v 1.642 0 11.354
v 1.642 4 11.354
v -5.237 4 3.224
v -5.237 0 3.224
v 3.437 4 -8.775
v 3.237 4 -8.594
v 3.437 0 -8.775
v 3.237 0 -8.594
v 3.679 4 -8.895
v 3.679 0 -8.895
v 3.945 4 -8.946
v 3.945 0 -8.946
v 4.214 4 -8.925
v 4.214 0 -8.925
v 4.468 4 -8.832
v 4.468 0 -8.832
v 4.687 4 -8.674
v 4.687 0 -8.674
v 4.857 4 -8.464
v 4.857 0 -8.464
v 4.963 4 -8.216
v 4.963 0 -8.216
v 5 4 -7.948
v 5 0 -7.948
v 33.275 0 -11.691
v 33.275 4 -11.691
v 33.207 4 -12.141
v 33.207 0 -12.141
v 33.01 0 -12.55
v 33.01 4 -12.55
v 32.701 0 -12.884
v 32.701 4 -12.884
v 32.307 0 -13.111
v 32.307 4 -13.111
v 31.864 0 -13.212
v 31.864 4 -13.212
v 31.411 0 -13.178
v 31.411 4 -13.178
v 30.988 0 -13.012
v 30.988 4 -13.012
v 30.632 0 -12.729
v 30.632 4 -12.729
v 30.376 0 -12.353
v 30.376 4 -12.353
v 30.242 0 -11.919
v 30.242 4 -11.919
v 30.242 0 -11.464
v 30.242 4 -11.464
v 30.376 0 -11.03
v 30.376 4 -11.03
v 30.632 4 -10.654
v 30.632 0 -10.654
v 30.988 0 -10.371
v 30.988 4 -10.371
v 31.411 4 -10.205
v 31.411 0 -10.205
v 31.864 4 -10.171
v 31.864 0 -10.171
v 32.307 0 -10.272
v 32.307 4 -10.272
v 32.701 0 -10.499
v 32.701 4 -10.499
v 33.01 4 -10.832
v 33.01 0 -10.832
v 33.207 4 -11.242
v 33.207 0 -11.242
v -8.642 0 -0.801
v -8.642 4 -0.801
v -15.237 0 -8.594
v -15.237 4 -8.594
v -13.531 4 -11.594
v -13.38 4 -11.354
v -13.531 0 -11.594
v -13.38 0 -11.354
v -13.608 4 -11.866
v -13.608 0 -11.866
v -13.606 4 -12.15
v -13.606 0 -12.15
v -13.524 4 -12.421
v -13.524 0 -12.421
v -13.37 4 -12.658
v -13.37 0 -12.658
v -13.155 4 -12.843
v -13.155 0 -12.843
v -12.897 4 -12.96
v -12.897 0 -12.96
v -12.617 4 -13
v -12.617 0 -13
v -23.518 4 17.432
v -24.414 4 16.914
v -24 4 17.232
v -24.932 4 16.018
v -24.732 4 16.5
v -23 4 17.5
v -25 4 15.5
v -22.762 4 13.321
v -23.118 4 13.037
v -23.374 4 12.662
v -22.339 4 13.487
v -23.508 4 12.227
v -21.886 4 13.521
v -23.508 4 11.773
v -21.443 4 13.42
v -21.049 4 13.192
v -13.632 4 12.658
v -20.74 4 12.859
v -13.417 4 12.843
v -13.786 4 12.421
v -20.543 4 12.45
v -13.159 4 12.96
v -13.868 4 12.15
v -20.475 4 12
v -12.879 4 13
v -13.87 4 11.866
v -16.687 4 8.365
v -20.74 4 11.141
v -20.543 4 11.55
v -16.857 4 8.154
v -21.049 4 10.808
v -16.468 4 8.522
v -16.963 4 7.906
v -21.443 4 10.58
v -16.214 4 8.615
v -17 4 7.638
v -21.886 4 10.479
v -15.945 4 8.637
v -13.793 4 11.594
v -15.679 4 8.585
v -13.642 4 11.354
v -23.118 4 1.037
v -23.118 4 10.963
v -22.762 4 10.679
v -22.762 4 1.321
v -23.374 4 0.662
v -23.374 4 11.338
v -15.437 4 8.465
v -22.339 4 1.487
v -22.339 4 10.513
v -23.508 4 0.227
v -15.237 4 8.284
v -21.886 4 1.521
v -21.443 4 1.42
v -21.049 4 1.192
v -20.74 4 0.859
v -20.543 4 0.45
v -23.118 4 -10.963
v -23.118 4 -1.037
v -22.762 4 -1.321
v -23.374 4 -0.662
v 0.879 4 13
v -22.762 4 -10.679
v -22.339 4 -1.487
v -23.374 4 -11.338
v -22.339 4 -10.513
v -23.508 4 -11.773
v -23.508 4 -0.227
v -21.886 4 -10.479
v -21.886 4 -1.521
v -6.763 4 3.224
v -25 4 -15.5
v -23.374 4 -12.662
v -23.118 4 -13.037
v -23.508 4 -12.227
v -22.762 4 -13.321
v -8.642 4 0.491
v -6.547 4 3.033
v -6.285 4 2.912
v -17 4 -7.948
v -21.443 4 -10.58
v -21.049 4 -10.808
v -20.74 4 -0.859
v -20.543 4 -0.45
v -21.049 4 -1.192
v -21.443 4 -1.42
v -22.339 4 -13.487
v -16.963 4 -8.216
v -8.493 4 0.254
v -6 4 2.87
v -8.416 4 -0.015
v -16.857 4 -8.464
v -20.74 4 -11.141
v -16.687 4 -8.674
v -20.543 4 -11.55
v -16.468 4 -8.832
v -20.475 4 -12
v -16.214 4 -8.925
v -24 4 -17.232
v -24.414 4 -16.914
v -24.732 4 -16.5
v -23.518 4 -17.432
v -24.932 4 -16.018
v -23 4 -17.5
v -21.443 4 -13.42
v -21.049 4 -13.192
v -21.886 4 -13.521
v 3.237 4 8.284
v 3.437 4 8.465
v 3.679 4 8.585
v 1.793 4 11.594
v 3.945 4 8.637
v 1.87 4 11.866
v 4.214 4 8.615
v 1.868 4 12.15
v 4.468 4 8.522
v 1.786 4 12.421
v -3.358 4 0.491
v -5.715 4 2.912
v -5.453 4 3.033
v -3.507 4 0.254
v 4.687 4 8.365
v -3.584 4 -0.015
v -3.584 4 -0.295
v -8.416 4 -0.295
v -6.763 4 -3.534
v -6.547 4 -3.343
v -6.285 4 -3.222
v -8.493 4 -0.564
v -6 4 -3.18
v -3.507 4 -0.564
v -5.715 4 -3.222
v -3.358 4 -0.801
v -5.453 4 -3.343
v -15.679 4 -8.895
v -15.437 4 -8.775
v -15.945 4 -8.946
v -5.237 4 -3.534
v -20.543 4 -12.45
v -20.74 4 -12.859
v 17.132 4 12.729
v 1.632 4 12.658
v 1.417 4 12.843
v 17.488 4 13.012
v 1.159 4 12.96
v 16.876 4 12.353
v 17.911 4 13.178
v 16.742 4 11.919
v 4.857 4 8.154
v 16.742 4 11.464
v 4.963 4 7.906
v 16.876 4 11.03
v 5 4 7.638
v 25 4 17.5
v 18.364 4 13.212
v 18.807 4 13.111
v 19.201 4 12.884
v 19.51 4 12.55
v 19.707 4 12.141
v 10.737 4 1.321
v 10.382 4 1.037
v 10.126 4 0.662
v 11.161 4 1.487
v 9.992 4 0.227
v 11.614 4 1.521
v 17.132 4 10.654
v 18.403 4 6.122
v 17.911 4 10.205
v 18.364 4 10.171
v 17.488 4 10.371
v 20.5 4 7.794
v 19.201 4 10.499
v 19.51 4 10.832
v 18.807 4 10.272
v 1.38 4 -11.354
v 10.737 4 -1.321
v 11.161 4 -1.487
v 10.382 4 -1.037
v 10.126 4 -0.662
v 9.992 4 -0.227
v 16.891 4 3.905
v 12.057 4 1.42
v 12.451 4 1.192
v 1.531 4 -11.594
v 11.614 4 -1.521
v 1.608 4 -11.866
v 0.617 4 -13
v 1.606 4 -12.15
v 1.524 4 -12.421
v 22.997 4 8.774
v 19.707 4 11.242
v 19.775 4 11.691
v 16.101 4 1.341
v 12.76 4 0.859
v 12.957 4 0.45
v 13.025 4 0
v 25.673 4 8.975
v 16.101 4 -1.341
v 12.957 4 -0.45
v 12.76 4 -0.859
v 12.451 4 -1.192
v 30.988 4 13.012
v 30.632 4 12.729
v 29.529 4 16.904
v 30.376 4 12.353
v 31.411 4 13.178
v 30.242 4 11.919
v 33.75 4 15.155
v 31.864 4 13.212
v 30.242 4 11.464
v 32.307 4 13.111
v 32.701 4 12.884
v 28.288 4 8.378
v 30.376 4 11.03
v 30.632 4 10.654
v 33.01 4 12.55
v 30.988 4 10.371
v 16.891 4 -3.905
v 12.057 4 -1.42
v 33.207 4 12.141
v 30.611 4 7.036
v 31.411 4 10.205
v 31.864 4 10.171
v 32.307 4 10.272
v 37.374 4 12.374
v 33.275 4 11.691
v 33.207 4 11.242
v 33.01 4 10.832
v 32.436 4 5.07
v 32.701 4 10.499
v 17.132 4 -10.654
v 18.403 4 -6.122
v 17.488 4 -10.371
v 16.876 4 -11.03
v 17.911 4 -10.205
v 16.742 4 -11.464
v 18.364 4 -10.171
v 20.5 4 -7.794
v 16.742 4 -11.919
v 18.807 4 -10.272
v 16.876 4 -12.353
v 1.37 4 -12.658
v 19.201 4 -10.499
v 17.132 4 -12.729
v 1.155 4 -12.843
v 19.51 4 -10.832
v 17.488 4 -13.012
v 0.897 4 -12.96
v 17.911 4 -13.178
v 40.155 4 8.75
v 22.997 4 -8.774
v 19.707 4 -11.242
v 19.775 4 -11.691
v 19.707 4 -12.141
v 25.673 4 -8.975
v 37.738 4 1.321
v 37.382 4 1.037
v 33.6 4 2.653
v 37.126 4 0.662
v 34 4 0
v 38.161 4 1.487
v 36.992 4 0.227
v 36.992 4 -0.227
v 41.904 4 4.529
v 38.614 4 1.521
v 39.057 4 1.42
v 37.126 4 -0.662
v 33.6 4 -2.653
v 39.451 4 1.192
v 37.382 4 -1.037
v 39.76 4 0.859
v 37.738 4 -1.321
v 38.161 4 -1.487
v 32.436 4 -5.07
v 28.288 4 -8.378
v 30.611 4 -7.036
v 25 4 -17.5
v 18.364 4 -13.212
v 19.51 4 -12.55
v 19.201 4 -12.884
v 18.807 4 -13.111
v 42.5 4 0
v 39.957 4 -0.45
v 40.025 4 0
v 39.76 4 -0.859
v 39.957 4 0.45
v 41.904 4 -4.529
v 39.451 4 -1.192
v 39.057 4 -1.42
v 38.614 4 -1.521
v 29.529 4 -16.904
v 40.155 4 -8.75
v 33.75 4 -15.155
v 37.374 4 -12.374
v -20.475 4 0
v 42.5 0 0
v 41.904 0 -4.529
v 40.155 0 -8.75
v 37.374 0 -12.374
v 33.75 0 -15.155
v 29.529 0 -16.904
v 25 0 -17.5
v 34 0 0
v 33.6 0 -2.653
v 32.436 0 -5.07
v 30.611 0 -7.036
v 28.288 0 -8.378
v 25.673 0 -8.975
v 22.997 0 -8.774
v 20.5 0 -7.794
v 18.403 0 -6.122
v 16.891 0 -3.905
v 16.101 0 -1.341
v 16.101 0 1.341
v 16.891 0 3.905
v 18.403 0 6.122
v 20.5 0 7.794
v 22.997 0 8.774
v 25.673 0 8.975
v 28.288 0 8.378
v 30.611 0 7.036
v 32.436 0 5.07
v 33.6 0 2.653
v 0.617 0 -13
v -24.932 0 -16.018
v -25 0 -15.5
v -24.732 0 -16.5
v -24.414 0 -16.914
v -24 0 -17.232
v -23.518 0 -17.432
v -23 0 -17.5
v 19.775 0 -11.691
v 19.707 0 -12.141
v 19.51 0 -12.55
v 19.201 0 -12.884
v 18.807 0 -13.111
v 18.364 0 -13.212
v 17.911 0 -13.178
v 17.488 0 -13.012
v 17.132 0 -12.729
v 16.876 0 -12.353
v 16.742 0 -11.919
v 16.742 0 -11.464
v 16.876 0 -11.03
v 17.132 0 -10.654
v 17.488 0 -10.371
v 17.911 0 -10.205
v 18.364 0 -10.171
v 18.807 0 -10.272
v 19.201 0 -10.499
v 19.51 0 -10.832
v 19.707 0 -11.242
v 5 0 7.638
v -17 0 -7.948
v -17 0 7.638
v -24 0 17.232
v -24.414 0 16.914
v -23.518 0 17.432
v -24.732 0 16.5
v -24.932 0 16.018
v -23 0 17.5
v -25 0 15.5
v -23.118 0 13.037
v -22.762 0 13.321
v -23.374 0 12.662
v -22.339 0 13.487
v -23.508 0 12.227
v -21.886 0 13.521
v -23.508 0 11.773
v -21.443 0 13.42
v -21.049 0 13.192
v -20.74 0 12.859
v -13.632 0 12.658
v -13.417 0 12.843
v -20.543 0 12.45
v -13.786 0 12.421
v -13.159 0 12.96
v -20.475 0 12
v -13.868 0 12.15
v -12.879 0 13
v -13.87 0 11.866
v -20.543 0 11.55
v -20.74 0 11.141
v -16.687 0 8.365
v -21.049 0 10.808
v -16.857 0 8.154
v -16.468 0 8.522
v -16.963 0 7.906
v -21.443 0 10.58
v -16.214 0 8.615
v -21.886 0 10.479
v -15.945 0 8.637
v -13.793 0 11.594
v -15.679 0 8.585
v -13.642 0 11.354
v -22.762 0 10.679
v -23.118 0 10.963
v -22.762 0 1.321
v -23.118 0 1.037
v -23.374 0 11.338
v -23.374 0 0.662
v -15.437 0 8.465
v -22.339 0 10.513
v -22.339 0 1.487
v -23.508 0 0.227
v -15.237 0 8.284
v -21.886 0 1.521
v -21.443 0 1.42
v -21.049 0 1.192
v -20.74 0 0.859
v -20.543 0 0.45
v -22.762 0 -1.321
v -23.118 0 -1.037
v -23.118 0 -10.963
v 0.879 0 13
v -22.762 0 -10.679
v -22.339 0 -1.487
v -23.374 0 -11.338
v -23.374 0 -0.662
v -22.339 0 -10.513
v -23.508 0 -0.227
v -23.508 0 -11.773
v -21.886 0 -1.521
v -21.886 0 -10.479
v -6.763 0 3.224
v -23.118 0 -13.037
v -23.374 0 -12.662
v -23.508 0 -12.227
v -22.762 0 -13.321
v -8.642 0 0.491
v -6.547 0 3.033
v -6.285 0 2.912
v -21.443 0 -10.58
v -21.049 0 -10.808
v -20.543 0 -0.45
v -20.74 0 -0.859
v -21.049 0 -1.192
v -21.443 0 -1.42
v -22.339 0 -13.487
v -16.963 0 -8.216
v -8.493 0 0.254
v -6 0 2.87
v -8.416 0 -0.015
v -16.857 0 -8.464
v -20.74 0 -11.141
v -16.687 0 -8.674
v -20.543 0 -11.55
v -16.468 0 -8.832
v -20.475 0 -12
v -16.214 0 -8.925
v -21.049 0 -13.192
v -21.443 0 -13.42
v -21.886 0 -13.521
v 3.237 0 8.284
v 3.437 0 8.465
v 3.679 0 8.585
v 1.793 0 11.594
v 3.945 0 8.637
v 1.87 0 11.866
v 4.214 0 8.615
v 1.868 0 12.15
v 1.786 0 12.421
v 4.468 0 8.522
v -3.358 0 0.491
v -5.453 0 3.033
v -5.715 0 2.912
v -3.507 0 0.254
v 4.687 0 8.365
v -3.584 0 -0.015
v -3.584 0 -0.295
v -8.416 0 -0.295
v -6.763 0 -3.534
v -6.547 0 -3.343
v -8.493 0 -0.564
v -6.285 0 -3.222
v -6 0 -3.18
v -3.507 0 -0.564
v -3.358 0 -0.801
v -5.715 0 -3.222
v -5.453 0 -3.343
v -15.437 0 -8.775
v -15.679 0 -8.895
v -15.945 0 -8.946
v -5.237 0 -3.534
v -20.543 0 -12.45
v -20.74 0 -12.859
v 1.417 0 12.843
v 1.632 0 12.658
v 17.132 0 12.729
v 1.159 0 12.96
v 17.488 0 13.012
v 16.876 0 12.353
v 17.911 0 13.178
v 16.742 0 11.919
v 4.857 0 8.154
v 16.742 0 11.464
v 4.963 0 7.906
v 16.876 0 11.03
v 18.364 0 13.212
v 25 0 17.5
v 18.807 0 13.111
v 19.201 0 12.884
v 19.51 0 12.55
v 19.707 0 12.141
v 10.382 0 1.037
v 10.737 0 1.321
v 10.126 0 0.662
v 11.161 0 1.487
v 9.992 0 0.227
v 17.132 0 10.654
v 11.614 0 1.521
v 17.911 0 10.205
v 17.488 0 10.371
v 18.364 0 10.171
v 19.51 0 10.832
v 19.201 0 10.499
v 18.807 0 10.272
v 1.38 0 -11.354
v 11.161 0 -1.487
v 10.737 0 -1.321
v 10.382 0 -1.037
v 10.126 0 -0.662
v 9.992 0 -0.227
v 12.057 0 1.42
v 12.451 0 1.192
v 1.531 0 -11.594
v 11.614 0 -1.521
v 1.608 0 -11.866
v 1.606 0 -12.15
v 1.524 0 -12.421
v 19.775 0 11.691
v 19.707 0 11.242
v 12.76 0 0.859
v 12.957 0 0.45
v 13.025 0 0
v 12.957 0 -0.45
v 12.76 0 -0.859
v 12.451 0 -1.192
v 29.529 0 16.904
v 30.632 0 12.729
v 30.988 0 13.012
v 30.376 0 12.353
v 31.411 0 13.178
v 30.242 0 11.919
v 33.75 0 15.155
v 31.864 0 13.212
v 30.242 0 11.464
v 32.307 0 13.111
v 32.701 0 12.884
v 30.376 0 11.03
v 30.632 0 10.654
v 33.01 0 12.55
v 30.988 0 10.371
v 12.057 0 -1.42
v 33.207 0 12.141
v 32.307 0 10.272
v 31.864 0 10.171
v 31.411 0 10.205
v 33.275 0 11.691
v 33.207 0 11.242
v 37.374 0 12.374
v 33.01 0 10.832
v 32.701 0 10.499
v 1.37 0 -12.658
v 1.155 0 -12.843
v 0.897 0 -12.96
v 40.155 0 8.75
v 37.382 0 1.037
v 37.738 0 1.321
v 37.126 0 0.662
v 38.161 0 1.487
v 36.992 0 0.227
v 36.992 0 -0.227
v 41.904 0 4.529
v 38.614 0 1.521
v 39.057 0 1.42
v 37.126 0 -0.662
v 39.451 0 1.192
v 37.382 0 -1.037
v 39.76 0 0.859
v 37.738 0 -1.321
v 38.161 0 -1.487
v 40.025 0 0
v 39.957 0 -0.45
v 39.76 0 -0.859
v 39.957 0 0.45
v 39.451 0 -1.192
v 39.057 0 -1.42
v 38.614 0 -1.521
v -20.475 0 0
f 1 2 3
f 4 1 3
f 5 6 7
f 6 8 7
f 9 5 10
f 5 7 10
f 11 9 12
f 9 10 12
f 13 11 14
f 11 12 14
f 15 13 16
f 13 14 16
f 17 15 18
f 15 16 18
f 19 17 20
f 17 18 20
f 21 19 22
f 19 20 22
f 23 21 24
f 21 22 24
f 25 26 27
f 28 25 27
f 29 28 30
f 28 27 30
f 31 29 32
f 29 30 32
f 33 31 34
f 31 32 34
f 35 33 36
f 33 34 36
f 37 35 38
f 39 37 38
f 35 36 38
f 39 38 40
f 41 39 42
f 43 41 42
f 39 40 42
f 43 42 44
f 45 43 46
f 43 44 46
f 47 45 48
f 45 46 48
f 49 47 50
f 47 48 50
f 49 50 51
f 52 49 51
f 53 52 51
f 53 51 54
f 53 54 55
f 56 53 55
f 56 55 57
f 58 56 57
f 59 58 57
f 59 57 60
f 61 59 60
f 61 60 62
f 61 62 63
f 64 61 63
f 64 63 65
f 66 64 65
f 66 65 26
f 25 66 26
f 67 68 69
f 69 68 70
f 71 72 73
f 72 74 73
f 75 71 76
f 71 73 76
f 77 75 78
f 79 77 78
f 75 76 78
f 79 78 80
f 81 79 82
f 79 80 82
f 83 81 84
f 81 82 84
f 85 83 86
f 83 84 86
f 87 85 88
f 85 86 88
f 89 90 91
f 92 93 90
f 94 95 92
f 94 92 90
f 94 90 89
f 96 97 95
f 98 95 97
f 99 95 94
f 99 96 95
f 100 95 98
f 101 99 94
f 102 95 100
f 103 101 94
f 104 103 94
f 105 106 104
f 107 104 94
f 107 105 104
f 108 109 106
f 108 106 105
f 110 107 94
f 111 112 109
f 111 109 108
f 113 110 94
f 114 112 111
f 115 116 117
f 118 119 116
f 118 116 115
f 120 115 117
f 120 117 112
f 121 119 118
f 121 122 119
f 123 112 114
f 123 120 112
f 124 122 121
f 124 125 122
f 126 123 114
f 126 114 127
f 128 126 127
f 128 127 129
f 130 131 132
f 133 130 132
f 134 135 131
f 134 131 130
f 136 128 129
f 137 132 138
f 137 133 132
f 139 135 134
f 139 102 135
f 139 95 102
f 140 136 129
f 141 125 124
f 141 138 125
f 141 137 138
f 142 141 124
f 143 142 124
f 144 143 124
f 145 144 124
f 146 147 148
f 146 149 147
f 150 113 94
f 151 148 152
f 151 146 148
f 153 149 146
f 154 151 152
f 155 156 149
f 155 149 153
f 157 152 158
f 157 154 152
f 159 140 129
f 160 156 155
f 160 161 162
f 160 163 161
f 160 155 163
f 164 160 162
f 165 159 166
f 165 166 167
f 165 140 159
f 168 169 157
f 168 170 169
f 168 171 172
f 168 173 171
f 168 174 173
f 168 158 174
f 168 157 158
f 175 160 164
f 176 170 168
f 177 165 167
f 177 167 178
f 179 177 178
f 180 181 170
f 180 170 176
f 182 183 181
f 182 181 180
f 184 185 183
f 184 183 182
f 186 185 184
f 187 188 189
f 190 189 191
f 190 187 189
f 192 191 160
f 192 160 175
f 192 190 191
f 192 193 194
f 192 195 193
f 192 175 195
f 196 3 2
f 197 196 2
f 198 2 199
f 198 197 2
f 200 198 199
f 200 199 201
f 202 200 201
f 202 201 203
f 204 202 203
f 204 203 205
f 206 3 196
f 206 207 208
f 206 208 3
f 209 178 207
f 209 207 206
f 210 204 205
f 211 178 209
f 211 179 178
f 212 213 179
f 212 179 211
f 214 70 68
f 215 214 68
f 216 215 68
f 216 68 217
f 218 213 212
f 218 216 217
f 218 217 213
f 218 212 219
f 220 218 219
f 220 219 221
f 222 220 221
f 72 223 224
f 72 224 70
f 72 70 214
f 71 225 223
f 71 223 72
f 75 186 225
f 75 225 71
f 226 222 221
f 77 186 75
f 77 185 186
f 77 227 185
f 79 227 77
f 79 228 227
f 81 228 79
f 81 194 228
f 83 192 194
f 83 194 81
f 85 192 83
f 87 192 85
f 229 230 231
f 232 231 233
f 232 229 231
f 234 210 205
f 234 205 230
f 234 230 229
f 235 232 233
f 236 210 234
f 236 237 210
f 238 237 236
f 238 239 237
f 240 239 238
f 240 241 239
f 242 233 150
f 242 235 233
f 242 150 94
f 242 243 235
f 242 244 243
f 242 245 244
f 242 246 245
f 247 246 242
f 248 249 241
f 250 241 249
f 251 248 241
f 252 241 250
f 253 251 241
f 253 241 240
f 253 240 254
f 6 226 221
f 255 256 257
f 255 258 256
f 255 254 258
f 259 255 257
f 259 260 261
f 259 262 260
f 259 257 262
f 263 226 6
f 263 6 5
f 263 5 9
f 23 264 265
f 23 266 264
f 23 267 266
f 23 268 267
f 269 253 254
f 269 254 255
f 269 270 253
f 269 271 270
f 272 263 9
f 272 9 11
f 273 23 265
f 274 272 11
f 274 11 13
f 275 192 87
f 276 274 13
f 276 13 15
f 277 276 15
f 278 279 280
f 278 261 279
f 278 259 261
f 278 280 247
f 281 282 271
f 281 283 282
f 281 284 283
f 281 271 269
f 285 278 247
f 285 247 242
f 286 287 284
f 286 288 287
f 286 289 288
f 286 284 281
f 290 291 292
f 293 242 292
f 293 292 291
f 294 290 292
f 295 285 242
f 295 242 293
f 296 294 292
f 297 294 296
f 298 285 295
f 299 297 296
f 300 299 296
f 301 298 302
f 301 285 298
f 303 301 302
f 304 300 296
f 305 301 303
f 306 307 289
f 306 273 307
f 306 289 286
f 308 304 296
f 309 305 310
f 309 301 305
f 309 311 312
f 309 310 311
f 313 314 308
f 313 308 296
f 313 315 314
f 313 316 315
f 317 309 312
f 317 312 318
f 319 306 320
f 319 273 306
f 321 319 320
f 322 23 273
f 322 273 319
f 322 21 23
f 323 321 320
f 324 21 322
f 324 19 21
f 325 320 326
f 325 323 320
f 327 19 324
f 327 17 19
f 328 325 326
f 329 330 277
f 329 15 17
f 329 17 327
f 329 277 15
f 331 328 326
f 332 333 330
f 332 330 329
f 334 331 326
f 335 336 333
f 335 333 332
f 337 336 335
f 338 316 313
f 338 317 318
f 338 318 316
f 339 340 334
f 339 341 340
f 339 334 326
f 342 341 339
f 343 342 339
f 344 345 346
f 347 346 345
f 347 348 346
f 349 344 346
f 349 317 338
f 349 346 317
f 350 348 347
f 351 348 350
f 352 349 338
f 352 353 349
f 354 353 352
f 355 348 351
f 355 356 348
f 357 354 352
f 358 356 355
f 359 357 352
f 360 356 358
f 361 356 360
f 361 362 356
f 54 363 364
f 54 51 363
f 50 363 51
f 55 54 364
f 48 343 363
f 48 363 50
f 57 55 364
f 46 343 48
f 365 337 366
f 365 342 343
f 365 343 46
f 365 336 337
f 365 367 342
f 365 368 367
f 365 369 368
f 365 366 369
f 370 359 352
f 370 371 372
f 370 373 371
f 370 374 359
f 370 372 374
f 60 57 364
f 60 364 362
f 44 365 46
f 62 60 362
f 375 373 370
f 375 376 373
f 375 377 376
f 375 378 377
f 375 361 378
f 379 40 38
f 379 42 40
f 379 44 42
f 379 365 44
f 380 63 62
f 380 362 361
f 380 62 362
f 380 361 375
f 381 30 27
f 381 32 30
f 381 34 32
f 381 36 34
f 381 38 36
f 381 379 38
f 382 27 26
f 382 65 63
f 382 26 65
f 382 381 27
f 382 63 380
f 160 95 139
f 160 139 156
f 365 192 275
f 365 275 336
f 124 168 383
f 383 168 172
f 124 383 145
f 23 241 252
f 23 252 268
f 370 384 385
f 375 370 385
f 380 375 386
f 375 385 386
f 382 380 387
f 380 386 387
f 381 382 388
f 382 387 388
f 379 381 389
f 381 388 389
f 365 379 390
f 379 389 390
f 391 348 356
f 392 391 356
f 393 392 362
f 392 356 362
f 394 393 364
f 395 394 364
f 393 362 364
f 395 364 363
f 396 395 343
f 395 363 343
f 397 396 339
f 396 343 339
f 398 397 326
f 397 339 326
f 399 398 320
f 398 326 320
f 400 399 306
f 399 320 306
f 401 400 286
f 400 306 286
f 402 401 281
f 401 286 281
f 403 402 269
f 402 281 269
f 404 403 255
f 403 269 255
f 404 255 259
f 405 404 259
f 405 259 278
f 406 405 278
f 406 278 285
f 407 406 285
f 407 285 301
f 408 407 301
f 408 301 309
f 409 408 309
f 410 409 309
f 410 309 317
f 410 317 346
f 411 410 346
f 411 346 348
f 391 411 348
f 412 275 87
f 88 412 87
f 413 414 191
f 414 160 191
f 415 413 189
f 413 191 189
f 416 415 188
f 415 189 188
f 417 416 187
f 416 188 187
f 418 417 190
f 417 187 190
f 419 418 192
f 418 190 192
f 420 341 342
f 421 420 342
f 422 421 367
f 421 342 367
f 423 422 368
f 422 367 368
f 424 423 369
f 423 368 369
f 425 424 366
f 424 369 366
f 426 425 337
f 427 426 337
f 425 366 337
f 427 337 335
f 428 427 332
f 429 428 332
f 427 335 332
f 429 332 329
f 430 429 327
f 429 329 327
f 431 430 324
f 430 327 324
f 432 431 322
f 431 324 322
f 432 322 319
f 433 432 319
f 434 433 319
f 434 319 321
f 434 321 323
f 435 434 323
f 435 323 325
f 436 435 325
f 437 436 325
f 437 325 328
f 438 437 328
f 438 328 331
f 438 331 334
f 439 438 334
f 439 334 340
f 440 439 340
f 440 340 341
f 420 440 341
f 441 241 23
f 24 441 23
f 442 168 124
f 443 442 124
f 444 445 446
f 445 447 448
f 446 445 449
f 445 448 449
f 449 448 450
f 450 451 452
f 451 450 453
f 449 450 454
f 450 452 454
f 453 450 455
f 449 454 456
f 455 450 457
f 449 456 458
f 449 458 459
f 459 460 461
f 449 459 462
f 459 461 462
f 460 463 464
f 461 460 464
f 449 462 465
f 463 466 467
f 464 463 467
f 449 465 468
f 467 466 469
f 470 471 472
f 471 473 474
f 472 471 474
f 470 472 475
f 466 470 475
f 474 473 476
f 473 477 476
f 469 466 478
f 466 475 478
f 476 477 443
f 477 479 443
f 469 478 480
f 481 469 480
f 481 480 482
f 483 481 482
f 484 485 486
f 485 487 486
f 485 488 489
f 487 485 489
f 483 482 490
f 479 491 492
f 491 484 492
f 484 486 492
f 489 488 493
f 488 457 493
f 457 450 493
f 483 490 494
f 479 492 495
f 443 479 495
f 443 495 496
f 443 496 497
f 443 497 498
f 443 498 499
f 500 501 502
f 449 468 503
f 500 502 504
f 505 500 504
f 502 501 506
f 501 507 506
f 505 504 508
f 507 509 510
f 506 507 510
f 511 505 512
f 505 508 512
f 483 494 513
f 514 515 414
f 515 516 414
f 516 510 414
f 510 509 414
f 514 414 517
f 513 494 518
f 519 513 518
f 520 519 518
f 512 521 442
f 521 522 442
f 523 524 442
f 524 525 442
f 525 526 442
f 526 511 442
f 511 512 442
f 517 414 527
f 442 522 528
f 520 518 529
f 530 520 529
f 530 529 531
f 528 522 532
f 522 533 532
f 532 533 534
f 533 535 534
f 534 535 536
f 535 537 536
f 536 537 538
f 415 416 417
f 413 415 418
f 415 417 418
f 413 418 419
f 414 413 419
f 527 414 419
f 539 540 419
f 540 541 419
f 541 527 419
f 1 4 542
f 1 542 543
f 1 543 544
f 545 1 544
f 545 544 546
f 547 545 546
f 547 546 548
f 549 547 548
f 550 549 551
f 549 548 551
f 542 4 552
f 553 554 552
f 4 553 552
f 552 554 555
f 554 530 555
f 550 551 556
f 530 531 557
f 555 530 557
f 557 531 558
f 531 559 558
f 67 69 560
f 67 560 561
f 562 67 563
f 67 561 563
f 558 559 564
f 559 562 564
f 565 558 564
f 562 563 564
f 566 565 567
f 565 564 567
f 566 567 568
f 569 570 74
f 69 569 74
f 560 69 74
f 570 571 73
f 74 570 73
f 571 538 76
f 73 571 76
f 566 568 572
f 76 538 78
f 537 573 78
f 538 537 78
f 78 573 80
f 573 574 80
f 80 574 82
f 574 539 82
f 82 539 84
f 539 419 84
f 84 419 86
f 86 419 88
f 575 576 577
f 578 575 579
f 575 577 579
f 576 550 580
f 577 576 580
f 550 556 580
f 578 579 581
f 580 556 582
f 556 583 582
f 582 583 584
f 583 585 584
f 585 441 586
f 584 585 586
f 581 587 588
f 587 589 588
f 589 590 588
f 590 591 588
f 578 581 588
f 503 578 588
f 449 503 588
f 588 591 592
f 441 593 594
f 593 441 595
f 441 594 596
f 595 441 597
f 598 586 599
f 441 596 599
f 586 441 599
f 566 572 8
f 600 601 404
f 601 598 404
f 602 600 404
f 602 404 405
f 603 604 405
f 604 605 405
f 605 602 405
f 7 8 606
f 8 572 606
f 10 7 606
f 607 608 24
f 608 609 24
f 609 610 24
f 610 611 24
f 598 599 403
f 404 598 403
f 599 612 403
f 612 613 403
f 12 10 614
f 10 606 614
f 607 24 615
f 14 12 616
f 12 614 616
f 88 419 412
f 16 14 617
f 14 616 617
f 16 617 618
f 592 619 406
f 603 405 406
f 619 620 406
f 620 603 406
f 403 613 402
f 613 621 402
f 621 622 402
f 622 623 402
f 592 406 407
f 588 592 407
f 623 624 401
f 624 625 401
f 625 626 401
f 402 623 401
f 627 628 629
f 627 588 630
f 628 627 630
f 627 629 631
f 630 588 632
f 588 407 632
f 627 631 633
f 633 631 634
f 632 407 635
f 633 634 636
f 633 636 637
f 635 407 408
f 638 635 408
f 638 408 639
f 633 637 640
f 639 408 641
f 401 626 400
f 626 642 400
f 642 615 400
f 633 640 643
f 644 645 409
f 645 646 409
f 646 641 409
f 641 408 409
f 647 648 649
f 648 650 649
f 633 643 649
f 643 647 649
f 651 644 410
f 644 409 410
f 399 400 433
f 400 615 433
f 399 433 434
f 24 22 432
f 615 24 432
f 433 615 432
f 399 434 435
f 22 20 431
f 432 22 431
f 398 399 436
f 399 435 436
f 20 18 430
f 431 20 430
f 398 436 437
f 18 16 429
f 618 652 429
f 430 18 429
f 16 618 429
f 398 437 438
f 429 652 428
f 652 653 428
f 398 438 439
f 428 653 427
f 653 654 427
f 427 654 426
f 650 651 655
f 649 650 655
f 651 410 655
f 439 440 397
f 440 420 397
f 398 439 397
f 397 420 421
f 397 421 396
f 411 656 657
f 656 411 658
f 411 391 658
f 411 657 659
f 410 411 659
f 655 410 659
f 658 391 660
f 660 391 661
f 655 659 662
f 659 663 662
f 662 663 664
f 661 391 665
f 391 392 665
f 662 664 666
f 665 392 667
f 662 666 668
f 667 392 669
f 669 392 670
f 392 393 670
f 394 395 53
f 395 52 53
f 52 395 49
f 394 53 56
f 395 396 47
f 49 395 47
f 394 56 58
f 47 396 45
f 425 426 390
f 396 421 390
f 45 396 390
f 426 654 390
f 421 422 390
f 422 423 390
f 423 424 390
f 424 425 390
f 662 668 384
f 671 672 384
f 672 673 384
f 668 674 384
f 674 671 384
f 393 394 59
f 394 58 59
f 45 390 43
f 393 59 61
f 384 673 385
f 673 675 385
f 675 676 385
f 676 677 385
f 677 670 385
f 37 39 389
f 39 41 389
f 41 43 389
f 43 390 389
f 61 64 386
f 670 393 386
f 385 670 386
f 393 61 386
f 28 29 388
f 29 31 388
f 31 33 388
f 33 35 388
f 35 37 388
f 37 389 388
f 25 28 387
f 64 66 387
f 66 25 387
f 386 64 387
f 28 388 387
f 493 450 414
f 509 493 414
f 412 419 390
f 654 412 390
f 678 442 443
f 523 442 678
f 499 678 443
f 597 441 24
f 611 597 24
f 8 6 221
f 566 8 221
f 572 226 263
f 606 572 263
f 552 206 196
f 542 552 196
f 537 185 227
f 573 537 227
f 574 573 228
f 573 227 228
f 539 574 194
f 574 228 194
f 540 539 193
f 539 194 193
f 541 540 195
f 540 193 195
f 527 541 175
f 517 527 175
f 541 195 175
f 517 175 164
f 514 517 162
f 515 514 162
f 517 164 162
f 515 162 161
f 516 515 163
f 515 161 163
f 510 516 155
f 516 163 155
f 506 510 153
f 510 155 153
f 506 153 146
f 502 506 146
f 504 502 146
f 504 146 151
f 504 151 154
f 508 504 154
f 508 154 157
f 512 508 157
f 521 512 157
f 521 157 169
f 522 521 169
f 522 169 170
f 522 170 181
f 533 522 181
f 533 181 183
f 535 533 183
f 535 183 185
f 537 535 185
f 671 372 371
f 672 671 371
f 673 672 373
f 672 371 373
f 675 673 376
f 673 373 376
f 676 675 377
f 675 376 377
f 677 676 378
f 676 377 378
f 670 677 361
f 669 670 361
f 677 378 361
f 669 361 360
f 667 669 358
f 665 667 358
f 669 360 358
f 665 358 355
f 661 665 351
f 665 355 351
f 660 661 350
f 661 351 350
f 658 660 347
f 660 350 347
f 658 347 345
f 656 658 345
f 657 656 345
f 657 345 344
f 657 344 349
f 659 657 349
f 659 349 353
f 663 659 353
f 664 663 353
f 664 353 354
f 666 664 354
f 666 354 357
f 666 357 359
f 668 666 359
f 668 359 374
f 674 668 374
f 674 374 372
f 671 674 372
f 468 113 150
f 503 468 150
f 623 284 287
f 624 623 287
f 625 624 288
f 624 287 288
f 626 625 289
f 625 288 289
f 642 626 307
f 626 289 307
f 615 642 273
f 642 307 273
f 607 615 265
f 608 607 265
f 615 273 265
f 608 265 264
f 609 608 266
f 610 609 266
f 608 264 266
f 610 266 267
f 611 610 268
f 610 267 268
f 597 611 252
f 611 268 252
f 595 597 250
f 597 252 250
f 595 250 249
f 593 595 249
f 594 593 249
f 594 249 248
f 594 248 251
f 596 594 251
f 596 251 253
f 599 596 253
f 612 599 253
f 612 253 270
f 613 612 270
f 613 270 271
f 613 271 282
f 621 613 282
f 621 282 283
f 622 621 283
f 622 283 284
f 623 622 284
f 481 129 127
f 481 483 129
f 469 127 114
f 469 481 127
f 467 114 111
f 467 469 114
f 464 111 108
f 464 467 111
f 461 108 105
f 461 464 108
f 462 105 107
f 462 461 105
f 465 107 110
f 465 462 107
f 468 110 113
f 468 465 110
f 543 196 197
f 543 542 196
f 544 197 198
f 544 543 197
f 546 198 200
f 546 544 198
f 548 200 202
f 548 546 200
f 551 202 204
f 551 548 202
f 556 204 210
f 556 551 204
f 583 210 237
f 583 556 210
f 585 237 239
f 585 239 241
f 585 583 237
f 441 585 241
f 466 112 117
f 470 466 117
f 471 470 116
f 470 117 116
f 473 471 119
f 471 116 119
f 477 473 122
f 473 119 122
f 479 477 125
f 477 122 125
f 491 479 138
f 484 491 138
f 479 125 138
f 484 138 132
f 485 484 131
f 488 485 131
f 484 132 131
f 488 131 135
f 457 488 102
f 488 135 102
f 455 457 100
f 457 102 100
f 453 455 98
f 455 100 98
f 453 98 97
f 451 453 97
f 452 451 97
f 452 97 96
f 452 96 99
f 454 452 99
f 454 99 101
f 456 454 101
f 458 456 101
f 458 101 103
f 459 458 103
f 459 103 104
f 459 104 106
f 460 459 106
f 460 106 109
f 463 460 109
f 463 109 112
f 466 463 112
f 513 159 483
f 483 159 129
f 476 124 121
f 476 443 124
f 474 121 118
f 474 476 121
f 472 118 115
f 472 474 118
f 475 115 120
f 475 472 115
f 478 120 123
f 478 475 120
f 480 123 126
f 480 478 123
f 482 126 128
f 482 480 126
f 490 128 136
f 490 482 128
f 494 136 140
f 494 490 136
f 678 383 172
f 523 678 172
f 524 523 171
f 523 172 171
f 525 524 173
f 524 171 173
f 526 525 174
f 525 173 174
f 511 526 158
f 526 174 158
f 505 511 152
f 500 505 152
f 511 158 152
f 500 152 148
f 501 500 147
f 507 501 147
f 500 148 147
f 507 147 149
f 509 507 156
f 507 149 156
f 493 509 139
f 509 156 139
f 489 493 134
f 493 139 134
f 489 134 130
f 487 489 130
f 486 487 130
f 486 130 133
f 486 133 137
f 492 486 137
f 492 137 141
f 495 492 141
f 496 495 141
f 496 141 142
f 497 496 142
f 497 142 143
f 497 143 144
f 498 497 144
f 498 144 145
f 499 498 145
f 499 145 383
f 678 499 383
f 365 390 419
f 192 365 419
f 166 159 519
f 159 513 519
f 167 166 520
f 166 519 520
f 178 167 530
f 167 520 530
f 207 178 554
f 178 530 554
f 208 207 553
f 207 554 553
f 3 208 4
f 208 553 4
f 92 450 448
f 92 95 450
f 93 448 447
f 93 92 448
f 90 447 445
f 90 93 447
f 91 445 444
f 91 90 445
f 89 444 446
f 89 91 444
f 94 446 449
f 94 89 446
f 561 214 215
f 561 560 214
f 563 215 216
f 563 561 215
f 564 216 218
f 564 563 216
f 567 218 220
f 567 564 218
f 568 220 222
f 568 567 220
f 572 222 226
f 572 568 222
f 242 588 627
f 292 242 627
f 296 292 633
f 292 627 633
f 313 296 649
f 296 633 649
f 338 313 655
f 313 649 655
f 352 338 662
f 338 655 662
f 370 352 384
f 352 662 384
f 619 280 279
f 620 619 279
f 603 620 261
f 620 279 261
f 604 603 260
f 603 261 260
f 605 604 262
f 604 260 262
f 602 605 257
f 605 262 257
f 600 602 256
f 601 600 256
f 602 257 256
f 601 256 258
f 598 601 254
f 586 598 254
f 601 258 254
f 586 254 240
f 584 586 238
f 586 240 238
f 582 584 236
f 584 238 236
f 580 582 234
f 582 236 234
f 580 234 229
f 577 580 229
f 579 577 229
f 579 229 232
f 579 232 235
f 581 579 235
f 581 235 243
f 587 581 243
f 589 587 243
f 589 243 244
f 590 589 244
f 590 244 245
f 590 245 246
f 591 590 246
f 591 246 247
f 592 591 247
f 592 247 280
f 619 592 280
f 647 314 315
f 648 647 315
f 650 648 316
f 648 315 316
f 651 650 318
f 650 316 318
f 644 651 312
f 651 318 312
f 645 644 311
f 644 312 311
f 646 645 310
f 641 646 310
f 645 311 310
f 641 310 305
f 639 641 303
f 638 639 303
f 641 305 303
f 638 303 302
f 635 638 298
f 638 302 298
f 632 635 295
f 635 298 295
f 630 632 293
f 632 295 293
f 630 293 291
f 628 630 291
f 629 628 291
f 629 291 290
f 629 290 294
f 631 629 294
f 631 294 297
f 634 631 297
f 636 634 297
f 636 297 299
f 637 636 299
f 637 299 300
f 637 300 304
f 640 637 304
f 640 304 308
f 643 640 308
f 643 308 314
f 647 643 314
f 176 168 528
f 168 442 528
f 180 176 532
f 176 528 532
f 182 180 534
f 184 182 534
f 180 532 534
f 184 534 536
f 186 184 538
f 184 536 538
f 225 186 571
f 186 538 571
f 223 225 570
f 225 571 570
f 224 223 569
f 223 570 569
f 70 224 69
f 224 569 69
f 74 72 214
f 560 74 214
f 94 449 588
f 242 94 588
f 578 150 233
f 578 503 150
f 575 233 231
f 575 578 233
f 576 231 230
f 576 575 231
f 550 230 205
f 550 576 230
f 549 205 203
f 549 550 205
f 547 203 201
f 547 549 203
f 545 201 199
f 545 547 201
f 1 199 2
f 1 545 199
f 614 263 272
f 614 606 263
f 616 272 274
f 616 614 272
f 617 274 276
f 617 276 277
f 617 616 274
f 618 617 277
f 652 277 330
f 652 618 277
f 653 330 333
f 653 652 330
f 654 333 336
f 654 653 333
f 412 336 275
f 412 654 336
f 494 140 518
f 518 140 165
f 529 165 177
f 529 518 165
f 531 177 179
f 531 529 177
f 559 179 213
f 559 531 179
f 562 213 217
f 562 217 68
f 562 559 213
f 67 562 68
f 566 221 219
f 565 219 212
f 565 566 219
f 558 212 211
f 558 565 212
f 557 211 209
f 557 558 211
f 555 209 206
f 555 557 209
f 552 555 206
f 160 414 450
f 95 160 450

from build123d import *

# Parameters (mm, degrees)
EXTRUDE_1_DEPTH     = 4
SKETCH_3_R          = 1.525
CUT_EXTRUDE_2_DEPTH = 5
SKETCH_4_R          = 9
CUT_EXTRUDE_3_DEPTH = 5
CUT_EXTRUDE_4_DEPTH = 5
FILLET_1_R          = 1
FILLET_2_R          = 2
SKETCH_7_R          = 1.525
CUT_EXTRUDE_5_DEPTH = 5


with BuildPart() as part:
    # 草图1 → 凸台-拉伸1 (new body)
    with BuildSketch(Plane(origin=(0, 0, 0), x_dir=(1, 0, 0), z_dir=(0, 1, 0))):
        with BuildLine():
            Line((-25, 17.5), (-25, -17.5))
            Line((-25, -17.5), (25, -17.5))
            ThreePointArc((25, -17.5), (7.5, 0), (25, 17.5))
            Line((25, 17.5), (-25, 17.5))
        make_face()
        with BuildLine():
            ThreePointArc((25, 17.5), (7.5, 0), (25, -17.5))
            Line((25, -17.5), (25, 17.5))
        make_face()
        with BuildLine():
            Line((25, 17.5), (25, -17.5))
            ThreePointArc((25, -17.5), (37.374368671, -12.374368671), (42.5, 0))
            ThreePointArc((42.5, 0), (37.374368671, 12.374368671), (25, 17.5))
        make_face()
    extrude(amount=EXTRUDE_1_DEPTH)

    # 草图3 → 切除-拉伸2 (cut, through all)
    with BuildSketch(Plane(origin=(0, 4, 0), x_dir=(1, 0, 0), z_dir=(0, 1, 0))):
        with Locations((38.5, 0)):
            Circle(SKETCH_3_R)
        with Locations((31.75, -11.691342951)):
            Circle(SKETCH_3_R)
        with Locations((18.25, -11.691342951)):
            Circle(SKETCH_3_R)
        with Locations((11.5, 0)):
            Circle(SKETCH_3_R)
        with Locations((18.25, 11.691342951)):
            Circle(SKETCH_3_R)
        with Locations((31.75, 11.691342951)):
            Circle(SKETCH_3_R)
    extrude(amount=-CUT_EXTRUDE_2_DEPTH, mode=Mode.SUBTRACT)

    # 草图4 → 切除-拉伸3 (cut, through all)
    with BuildSketch(Plane(origin=(0, 4, 0), x_dir=(1, 0, 0), z_dir=(0, 1, 0))):
        with Locations((25, 0)):
            Circle(SKETCH_4_R)
    extrude(amount=-CUT_EXTRUDE_3_DEPTH, mode=Mode.SUBTRACT)

    # 草图5 → 切除-拉伸4 (cut, through all)
    with BuildSketch(Plane(origin=(0, 4, 0), x_dir=(1, 0, 0), z_dir=(0, 1, 0))):
        Polygon((-14.773080244, 13), (-6, 2.631814257), (2.773080244, 13), align=None)
        Polygon((5, 10.67781095), (-3.904075524, 0.154812603), (5, -10.368185743), align=None)
        Polygon((-6, -2.32218905), (-15.035070804, -13), (3.035070804, -13), align=None)
        Polygon((-17, 10.67781095), (-17, -10.368185743), (-8.095924476, 0.154812603), align=None)
    extrude(amount=-CUT_EXTRUDE_4_DEPTH, mode=Mode.SUBTRACT)

    # 圆角1
    fillet_1_edges = [part.edges().sort_by_distance(p)[0] for p in [
        (-15.035070804, 2, 13),
        (-6, 2, 2.32218905),
        (3.035070804, 2, 13),
        (-3.904075524, 2, -0.154812603),
        (5, 2, -10.67781095),
        (5, 2, 10.368185743),
        (-17, 2, 10.368185743),
        (-17, 2, -10.67781095),
        (-8.095924476, 2, -0.154812603),
        (-6, 2, -2.631814257),
        (-14.773080244, 2, -13),
        (2.773080244, 2, -13),
    ]]
    fillet(fillet_1_edges, radius=FILLET_1_R)

    # 圆角2
    fillet_2_edges = [part.edges().sort_by_distance(p)[0] for p in [
        (-25, 2, 17.5),
        (-25, 2, -17.5),
    ]]
    fillet(fillet_2_edges, radius=FILLET_2_R)

    # 草图7 → 切除-拉伸5 (cut, through all)
    with BuildSketch(Plane(origin=(0, 4, 0), x_dir=(1, 0, 0), z_dir=(0, 1, 0))):
        with Locations((-22, 0)):
            Circle(SKETCH_7_R)
        with Locations((-22, 12)):
            Circle(SKETCH_7_R)
        with Locations((-22, -12)):
            Circle(SKETCH_7_R)
    extrude(amount=-CUT_EXTRUDE_5_DEPTH, mode=Mode.SUBTRACT)


solid = part.part
